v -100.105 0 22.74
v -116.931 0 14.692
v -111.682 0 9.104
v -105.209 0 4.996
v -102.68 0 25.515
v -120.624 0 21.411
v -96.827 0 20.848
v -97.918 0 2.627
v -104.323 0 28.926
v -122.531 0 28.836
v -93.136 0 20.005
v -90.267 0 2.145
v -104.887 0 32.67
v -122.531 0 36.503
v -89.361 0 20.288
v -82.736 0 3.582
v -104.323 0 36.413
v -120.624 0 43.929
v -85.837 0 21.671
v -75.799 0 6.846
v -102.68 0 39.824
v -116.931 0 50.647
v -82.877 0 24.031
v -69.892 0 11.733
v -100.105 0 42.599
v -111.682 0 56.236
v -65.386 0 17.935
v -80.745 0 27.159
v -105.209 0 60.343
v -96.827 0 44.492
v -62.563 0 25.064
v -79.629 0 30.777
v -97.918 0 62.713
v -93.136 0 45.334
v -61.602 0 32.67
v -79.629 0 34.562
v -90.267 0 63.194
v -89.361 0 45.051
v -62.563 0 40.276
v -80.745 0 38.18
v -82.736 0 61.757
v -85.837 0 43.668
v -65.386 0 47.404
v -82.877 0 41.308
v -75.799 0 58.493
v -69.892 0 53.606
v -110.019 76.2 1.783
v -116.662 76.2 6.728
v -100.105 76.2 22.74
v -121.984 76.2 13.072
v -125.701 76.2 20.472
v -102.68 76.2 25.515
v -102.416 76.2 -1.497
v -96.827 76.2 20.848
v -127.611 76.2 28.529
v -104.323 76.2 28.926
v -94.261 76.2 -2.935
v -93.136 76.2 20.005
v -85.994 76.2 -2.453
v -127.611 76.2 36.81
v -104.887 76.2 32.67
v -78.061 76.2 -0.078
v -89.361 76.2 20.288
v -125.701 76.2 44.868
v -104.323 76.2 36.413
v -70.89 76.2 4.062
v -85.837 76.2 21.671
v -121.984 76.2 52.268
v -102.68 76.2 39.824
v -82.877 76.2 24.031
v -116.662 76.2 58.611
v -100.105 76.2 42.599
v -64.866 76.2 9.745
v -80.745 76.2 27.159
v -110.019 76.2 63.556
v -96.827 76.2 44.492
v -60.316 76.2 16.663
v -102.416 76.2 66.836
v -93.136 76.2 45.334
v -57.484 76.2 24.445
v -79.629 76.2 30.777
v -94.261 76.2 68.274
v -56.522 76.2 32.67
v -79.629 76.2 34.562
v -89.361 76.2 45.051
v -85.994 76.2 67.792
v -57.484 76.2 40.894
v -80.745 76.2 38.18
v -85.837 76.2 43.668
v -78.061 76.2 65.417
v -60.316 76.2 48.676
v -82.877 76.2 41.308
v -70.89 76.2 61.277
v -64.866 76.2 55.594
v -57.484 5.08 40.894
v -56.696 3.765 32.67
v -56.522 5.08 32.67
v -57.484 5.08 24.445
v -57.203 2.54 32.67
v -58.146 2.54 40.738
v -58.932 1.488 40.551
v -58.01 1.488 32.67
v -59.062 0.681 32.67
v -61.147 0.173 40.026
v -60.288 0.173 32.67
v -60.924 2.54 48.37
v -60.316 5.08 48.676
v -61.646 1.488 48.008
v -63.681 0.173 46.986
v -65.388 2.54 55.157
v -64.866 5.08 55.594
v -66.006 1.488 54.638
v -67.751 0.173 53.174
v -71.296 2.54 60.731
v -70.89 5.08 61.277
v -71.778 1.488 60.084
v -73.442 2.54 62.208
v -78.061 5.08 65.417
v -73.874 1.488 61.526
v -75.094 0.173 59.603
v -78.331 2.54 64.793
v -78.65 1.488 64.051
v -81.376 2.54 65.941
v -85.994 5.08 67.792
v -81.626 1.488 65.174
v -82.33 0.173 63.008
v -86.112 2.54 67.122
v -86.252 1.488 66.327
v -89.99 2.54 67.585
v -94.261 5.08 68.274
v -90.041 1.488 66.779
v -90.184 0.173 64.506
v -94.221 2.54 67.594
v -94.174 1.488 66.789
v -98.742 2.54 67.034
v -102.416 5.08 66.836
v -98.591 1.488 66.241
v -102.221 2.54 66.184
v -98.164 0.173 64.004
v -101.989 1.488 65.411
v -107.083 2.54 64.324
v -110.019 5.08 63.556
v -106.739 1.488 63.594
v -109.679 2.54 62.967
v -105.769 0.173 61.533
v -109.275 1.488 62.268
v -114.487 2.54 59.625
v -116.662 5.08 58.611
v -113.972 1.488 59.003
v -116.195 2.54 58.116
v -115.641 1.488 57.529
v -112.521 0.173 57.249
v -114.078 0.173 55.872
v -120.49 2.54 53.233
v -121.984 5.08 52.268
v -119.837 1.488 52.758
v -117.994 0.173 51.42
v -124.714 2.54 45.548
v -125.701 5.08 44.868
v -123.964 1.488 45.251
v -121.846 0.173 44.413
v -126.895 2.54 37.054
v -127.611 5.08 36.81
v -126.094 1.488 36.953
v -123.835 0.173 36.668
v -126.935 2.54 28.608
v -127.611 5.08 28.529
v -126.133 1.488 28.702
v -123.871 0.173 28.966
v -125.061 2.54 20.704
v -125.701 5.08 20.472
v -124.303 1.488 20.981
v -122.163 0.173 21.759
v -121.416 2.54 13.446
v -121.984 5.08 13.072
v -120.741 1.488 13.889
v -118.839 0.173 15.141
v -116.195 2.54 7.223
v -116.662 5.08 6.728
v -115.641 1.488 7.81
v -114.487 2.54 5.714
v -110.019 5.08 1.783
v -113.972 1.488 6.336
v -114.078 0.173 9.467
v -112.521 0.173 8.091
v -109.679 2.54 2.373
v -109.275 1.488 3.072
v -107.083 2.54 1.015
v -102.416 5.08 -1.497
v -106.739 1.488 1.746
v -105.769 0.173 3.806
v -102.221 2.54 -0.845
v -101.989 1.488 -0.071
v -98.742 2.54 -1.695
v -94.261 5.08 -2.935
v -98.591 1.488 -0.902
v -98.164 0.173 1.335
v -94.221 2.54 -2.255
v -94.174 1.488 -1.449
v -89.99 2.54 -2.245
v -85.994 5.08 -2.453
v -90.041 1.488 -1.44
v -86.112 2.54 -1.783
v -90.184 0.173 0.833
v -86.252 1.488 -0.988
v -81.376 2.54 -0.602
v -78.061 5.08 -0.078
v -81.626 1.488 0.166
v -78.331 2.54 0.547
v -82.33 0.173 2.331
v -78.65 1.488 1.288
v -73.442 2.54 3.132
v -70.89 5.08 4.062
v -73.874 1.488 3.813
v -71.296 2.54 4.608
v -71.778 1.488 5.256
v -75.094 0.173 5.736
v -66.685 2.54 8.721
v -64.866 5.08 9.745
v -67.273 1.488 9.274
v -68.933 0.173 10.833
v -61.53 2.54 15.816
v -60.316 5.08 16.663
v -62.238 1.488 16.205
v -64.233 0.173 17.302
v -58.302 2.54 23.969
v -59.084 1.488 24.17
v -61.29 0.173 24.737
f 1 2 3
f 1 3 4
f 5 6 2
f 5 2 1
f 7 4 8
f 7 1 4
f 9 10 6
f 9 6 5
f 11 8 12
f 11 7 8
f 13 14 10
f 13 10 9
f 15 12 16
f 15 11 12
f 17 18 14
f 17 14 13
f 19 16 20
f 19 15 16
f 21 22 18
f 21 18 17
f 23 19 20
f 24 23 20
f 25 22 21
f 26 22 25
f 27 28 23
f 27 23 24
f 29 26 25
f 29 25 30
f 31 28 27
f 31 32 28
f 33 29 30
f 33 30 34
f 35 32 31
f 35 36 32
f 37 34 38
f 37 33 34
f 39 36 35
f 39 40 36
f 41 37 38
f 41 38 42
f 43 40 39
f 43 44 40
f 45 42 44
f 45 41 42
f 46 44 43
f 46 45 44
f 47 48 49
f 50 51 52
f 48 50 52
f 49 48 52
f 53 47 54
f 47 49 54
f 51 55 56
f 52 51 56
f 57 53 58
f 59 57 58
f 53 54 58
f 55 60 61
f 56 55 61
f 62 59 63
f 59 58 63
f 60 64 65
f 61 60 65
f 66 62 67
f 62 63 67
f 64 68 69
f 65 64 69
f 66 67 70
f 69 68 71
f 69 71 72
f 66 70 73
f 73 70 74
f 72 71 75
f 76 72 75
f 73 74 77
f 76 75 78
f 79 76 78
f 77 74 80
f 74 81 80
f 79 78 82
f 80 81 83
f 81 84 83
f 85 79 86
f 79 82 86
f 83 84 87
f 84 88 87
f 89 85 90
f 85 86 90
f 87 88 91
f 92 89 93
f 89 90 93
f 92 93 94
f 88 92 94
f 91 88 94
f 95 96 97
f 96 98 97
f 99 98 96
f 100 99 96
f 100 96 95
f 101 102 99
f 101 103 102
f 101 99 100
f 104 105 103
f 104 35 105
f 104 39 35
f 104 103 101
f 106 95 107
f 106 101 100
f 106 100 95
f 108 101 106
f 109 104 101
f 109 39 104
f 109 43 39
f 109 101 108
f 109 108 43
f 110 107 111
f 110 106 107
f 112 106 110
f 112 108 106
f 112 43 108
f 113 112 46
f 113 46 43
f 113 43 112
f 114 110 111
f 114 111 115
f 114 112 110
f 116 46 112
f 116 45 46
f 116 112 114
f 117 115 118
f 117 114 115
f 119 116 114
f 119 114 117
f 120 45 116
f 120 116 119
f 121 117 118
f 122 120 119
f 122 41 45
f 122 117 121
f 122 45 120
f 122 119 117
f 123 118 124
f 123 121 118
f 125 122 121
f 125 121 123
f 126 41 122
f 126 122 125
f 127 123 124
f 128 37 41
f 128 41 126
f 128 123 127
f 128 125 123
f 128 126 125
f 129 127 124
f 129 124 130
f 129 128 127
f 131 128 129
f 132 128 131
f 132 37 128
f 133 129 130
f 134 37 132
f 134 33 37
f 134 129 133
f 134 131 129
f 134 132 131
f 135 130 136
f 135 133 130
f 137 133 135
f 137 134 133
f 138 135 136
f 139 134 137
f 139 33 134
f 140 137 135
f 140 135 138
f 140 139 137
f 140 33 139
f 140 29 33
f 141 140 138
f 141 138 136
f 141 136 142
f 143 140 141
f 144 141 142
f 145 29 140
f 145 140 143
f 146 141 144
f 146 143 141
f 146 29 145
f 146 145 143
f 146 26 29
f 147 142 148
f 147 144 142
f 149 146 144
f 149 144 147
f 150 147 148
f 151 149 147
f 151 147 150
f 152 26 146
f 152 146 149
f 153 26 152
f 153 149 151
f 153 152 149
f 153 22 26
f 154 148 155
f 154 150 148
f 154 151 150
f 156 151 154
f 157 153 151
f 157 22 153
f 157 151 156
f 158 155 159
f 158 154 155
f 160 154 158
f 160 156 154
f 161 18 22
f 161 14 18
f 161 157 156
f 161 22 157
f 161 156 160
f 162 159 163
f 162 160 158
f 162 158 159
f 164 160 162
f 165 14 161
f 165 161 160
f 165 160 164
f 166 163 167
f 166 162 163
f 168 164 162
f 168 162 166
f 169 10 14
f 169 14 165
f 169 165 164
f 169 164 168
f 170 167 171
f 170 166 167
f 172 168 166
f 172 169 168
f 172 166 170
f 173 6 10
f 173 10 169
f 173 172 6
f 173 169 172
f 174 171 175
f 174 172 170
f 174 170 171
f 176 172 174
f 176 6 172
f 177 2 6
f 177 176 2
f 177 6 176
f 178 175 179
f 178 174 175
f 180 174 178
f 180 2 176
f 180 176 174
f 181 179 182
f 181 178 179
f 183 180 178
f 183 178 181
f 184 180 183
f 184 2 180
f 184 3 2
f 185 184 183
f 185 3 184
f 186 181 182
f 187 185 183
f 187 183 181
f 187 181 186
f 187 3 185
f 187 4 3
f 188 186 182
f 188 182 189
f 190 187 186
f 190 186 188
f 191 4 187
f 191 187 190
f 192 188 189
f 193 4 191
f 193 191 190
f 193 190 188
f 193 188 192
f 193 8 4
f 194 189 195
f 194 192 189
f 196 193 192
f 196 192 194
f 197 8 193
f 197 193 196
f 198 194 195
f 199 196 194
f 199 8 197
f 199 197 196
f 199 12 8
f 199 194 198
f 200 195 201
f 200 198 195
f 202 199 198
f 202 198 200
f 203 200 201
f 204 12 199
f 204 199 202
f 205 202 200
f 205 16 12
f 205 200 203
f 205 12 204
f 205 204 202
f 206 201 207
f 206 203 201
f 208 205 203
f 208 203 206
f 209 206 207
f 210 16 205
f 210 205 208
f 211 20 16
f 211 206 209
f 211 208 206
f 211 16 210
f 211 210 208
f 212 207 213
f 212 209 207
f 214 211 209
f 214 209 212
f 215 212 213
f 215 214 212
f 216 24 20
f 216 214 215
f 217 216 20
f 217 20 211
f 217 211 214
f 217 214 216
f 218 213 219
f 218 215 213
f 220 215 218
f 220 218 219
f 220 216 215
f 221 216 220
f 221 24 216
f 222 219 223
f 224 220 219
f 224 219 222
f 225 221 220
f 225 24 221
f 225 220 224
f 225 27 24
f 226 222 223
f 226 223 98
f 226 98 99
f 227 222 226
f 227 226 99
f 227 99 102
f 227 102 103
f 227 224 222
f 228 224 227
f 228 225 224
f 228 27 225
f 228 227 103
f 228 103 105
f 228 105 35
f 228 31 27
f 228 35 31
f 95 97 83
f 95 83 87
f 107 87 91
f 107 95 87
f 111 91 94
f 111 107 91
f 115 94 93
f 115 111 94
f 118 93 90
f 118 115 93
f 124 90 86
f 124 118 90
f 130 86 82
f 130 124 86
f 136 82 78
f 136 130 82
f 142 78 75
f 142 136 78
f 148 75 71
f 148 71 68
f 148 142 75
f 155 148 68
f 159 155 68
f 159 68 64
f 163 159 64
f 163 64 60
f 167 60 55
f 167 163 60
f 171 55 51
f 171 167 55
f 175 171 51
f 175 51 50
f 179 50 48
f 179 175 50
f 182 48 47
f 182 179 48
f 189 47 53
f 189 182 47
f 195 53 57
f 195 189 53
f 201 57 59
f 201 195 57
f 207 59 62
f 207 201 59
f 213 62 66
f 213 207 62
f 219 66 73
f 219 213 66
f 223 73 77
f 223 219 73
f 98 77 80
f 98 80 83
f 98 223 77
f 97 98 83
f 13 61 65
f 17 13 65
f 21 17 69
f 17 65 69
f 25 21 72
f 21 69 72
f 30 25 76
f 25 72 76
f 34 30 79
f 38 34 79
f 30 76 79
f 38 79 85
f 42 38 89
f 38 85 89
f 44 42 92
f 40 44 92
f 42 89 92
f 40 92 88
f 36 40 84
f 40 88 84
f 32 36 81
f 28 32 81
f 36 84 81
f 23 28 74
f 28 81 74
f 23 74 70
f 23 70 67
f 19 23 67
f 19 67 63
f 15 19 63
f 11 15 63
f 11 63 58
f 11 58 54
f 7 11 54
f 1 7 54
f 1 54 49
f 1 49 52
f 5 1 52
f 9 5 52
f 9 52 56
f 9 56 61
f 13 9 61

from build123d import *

# Parameters (mm, degrees)
F0_R     = 35.664624
F1_DEPTH = 76.2
F3_D     = 25.4
F4_R     = 5.08


with BuildPart() as f1:
    # F0 (on Front) → F1 (new body)
    with BuildSketch(Plane.XZ):
        with Locations((-92.187047, 32.669652)):
            Circle(F0_R)
    extrude(amount=-F1_DEPTH)

    # F3 (through all)
    with Locations(Plane.XZ):
        with Locations((-92.187047, 32.669652)):
            Hole(F3_D / 2)

    # F4
    f4_edges = [f1.edges().sort_by_distance(p)[0] for p in [
        (-127.851671, 0, 32.669652),
    ]]
    fillet(f4_edges, radius=F4_R)


solid = f1.part
